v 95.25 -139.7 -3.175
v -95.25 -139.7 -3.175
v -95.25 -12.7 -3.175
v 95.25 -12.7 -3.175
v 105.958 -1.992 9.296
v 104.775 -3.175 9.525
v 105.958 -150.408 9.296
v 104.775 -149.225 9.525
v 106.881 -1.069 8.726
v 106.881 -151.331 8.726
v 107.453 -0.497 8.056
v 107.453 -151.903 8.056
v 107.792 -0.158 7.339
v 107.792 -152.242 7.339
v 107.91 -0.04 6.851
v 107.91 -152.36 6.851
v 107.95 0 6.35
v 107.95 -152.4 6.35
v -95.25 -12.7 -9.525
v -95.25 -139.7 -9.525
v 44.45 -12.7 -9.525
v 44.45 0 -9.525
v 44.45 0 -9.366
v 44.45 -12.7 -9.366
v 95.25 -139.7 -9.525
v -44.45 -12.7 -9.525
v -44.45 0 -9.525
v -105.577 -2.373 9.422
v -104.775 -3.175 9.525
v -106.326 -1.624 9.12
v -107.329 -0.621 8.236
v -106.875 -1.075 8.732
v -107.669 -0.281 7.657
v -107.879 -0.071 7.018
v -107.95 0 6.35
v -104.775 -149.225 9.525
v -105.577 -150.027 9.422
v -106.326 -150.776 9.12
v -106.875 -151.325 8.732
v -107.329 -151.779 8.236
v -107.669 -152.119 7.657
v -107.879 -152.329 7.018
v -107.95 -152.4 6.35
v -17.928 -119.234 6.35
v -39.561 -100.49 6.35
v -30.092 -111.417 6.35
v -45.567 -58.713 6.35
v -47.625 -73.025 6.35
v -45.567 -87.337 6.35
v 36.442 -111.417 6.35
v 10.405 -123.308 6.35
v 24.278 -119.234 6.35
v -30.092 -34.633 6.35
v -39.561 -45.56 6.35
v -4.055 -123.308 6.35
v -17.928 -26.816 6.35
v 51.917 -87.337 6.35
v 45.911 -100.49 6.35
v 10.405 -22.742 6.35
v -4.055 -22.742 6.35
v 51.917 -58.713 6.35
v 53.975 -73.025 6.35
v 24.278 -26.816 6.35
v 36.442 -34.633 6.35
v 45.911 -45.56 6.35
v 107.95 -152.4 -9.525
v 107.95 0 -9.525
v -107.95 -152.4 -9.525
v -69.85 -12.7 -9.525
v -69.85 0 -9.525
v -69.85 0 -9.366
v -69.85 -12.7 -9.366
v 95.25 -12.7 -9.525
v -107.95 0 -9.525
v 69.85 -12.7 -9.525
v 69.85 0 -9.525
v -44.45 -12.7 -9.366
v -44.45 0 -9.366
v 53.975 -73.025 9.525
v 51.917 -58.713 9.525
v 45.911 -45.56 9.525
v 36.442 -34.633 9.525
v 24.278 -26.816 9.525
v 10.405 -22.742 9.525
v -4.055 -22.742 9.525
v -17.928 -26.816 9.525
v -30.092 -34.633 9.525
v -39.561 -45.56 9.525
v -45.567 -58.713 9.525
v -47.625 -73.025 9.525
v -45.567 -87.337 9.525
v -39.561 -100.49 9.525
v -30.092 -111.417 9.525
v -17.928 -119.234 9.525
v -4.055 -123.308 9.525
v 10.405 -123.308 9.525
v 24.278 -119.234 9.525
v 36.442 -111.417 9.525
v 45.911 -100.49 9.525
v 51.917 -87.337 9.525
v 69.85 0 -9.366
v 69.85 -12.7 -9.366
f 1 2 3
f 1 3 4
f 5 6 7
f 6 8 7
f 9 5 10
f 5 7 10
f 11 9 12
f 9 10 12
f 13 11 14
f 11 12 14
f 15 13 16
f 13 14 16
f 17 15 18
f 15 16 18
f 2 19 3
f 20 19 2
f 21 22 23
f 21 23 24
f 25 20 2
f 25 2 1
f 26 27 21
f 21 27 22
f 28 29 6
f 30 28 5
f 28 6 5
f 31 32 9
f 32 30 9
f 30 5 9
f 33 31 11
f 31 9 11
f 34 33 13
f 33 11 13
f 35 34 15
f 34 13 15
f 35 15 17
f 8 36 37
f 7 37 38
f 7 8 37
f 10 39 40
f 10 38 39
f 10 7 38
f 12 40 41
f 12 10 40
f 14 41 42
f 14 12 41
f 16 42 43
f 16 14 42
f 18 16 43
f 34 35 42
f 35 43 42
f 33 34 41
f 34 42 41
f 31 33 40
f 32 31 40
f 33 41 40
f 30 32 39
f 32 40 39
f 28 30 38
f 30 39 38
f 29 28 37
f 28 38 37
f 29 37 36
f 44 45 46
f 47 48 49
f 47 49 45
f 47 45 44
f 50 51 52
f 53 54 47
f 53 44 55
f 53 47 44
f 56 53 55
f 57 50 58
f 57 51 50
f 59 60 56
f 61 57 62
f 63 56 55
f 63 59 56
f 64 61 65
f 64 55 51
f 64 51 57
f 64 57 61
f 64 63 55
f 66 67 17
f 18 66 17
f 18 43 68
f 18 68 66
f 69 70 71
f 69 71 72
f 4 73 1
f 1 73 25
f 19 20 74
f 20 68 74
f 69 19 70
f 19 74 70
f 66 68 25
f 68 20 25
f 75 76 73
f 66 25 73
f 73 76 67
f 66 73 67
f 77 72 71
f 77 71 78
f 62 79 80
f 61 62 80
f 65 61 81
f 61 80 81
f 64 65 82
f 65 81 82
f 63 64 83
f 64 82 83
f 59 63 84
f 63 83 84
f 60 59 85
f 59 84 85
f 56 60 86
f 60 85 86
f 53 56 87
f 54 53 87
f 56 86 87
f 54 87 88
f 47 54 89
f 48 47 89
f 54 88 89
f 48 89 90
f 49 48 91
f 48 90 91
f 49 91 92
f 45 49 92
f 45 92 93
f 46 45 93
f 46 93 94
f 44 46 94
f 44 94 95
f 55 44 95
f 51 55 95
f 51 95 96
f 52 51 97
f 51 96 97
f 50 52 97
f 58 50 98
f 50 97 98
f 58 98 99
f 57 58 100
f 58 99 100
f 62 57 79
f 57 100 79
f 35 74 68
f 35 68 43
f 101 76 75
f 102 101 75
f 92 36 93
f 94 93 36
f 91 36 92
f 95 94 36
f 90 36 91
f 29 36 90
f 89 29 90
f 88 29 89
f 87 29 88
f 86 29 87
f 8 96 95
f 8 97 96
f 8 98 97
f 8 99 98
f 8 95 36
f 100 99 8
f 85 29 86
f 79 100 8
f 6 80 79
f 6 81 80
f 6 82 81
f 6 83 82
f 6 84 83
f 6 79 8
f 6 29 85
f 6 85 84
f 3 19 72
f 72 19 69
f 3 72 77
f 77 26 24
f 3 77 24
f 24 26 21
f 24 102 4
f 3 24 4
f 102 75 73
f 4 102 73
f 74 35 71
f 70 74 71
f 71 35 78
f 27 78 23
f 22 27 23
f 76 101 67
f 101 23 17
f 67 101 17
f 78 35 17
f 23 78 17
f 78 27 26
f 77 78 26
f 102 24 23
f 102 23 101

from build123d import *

# Parameters (mm, degrees)
F0_W     = 215.9
F0_H     = 19.05
F1_DEPTH = 152.4
F2_W     = 190.5
F2_H     = 127
F3_DEPTH = 6.35
F4_W     = 25.4
F4_H     = 12.7
F5_DEPTH = 0.15875
F6_R     = 3.175
F7_R     = 50.8
F8_DEPTH = 3.175


with BuildPart() as f1:
    # F0 (on Front) → F1 (new body)
    with BuildSketch(Plane.XZ):
        Rectangle(F0_W, F0_H)
    extrude(amount=F1_DEPTH)

    # F2 (on face) → F3 (cut)
    with BuildSketch(Plane(origin=(0, 0, -9.525), x_dir=(1, 0, 0), z_dir=(0, 0, -1))):
        with Locations((0, 76.2)):
            Rectangle(F2_W, F2_H)
    extrude(amount=-F3_DEPTH, mode=Mode.SUBTRACT)

    # F4 (on face) → F5 (cut)
    with BuildSketch(Plane(origin=(0, 0, -9.525), x_dir=(1, 0, 0), z_dir=(0, 0, -1))):
        with Locations((-57.15, 6.35)):
            Rectangle(F4_W, F4_H)
        with Locations((57.15, 6.35)):
            Rectangle(F4_W, F4_H)
    extrude(amount=-F5_DEPTH, mode=Mode.SUBTRACT)

    # F6
    f6_edges = [f1.edges().sort_by_distance(p)[0] for p in [
        (107.95, -76.2, 9.525),
        (-107.95, -76.2, 9.525),
        (0, 0, 9.525),
        (0, -152.4, 9.525),
    ]]
    fillet(f6_edges, radius=F6_R)

    # F7 (on face) → F8 (cut)
    with BuildSketch(Plane.XY.offset(9.525)):
        with Locations((3.175, -73.025)):
            Circle(F7_R)
    extrude(amount=-F8_DEPTH, mode=Mode.SUBTRACT)


solid = f1.part
